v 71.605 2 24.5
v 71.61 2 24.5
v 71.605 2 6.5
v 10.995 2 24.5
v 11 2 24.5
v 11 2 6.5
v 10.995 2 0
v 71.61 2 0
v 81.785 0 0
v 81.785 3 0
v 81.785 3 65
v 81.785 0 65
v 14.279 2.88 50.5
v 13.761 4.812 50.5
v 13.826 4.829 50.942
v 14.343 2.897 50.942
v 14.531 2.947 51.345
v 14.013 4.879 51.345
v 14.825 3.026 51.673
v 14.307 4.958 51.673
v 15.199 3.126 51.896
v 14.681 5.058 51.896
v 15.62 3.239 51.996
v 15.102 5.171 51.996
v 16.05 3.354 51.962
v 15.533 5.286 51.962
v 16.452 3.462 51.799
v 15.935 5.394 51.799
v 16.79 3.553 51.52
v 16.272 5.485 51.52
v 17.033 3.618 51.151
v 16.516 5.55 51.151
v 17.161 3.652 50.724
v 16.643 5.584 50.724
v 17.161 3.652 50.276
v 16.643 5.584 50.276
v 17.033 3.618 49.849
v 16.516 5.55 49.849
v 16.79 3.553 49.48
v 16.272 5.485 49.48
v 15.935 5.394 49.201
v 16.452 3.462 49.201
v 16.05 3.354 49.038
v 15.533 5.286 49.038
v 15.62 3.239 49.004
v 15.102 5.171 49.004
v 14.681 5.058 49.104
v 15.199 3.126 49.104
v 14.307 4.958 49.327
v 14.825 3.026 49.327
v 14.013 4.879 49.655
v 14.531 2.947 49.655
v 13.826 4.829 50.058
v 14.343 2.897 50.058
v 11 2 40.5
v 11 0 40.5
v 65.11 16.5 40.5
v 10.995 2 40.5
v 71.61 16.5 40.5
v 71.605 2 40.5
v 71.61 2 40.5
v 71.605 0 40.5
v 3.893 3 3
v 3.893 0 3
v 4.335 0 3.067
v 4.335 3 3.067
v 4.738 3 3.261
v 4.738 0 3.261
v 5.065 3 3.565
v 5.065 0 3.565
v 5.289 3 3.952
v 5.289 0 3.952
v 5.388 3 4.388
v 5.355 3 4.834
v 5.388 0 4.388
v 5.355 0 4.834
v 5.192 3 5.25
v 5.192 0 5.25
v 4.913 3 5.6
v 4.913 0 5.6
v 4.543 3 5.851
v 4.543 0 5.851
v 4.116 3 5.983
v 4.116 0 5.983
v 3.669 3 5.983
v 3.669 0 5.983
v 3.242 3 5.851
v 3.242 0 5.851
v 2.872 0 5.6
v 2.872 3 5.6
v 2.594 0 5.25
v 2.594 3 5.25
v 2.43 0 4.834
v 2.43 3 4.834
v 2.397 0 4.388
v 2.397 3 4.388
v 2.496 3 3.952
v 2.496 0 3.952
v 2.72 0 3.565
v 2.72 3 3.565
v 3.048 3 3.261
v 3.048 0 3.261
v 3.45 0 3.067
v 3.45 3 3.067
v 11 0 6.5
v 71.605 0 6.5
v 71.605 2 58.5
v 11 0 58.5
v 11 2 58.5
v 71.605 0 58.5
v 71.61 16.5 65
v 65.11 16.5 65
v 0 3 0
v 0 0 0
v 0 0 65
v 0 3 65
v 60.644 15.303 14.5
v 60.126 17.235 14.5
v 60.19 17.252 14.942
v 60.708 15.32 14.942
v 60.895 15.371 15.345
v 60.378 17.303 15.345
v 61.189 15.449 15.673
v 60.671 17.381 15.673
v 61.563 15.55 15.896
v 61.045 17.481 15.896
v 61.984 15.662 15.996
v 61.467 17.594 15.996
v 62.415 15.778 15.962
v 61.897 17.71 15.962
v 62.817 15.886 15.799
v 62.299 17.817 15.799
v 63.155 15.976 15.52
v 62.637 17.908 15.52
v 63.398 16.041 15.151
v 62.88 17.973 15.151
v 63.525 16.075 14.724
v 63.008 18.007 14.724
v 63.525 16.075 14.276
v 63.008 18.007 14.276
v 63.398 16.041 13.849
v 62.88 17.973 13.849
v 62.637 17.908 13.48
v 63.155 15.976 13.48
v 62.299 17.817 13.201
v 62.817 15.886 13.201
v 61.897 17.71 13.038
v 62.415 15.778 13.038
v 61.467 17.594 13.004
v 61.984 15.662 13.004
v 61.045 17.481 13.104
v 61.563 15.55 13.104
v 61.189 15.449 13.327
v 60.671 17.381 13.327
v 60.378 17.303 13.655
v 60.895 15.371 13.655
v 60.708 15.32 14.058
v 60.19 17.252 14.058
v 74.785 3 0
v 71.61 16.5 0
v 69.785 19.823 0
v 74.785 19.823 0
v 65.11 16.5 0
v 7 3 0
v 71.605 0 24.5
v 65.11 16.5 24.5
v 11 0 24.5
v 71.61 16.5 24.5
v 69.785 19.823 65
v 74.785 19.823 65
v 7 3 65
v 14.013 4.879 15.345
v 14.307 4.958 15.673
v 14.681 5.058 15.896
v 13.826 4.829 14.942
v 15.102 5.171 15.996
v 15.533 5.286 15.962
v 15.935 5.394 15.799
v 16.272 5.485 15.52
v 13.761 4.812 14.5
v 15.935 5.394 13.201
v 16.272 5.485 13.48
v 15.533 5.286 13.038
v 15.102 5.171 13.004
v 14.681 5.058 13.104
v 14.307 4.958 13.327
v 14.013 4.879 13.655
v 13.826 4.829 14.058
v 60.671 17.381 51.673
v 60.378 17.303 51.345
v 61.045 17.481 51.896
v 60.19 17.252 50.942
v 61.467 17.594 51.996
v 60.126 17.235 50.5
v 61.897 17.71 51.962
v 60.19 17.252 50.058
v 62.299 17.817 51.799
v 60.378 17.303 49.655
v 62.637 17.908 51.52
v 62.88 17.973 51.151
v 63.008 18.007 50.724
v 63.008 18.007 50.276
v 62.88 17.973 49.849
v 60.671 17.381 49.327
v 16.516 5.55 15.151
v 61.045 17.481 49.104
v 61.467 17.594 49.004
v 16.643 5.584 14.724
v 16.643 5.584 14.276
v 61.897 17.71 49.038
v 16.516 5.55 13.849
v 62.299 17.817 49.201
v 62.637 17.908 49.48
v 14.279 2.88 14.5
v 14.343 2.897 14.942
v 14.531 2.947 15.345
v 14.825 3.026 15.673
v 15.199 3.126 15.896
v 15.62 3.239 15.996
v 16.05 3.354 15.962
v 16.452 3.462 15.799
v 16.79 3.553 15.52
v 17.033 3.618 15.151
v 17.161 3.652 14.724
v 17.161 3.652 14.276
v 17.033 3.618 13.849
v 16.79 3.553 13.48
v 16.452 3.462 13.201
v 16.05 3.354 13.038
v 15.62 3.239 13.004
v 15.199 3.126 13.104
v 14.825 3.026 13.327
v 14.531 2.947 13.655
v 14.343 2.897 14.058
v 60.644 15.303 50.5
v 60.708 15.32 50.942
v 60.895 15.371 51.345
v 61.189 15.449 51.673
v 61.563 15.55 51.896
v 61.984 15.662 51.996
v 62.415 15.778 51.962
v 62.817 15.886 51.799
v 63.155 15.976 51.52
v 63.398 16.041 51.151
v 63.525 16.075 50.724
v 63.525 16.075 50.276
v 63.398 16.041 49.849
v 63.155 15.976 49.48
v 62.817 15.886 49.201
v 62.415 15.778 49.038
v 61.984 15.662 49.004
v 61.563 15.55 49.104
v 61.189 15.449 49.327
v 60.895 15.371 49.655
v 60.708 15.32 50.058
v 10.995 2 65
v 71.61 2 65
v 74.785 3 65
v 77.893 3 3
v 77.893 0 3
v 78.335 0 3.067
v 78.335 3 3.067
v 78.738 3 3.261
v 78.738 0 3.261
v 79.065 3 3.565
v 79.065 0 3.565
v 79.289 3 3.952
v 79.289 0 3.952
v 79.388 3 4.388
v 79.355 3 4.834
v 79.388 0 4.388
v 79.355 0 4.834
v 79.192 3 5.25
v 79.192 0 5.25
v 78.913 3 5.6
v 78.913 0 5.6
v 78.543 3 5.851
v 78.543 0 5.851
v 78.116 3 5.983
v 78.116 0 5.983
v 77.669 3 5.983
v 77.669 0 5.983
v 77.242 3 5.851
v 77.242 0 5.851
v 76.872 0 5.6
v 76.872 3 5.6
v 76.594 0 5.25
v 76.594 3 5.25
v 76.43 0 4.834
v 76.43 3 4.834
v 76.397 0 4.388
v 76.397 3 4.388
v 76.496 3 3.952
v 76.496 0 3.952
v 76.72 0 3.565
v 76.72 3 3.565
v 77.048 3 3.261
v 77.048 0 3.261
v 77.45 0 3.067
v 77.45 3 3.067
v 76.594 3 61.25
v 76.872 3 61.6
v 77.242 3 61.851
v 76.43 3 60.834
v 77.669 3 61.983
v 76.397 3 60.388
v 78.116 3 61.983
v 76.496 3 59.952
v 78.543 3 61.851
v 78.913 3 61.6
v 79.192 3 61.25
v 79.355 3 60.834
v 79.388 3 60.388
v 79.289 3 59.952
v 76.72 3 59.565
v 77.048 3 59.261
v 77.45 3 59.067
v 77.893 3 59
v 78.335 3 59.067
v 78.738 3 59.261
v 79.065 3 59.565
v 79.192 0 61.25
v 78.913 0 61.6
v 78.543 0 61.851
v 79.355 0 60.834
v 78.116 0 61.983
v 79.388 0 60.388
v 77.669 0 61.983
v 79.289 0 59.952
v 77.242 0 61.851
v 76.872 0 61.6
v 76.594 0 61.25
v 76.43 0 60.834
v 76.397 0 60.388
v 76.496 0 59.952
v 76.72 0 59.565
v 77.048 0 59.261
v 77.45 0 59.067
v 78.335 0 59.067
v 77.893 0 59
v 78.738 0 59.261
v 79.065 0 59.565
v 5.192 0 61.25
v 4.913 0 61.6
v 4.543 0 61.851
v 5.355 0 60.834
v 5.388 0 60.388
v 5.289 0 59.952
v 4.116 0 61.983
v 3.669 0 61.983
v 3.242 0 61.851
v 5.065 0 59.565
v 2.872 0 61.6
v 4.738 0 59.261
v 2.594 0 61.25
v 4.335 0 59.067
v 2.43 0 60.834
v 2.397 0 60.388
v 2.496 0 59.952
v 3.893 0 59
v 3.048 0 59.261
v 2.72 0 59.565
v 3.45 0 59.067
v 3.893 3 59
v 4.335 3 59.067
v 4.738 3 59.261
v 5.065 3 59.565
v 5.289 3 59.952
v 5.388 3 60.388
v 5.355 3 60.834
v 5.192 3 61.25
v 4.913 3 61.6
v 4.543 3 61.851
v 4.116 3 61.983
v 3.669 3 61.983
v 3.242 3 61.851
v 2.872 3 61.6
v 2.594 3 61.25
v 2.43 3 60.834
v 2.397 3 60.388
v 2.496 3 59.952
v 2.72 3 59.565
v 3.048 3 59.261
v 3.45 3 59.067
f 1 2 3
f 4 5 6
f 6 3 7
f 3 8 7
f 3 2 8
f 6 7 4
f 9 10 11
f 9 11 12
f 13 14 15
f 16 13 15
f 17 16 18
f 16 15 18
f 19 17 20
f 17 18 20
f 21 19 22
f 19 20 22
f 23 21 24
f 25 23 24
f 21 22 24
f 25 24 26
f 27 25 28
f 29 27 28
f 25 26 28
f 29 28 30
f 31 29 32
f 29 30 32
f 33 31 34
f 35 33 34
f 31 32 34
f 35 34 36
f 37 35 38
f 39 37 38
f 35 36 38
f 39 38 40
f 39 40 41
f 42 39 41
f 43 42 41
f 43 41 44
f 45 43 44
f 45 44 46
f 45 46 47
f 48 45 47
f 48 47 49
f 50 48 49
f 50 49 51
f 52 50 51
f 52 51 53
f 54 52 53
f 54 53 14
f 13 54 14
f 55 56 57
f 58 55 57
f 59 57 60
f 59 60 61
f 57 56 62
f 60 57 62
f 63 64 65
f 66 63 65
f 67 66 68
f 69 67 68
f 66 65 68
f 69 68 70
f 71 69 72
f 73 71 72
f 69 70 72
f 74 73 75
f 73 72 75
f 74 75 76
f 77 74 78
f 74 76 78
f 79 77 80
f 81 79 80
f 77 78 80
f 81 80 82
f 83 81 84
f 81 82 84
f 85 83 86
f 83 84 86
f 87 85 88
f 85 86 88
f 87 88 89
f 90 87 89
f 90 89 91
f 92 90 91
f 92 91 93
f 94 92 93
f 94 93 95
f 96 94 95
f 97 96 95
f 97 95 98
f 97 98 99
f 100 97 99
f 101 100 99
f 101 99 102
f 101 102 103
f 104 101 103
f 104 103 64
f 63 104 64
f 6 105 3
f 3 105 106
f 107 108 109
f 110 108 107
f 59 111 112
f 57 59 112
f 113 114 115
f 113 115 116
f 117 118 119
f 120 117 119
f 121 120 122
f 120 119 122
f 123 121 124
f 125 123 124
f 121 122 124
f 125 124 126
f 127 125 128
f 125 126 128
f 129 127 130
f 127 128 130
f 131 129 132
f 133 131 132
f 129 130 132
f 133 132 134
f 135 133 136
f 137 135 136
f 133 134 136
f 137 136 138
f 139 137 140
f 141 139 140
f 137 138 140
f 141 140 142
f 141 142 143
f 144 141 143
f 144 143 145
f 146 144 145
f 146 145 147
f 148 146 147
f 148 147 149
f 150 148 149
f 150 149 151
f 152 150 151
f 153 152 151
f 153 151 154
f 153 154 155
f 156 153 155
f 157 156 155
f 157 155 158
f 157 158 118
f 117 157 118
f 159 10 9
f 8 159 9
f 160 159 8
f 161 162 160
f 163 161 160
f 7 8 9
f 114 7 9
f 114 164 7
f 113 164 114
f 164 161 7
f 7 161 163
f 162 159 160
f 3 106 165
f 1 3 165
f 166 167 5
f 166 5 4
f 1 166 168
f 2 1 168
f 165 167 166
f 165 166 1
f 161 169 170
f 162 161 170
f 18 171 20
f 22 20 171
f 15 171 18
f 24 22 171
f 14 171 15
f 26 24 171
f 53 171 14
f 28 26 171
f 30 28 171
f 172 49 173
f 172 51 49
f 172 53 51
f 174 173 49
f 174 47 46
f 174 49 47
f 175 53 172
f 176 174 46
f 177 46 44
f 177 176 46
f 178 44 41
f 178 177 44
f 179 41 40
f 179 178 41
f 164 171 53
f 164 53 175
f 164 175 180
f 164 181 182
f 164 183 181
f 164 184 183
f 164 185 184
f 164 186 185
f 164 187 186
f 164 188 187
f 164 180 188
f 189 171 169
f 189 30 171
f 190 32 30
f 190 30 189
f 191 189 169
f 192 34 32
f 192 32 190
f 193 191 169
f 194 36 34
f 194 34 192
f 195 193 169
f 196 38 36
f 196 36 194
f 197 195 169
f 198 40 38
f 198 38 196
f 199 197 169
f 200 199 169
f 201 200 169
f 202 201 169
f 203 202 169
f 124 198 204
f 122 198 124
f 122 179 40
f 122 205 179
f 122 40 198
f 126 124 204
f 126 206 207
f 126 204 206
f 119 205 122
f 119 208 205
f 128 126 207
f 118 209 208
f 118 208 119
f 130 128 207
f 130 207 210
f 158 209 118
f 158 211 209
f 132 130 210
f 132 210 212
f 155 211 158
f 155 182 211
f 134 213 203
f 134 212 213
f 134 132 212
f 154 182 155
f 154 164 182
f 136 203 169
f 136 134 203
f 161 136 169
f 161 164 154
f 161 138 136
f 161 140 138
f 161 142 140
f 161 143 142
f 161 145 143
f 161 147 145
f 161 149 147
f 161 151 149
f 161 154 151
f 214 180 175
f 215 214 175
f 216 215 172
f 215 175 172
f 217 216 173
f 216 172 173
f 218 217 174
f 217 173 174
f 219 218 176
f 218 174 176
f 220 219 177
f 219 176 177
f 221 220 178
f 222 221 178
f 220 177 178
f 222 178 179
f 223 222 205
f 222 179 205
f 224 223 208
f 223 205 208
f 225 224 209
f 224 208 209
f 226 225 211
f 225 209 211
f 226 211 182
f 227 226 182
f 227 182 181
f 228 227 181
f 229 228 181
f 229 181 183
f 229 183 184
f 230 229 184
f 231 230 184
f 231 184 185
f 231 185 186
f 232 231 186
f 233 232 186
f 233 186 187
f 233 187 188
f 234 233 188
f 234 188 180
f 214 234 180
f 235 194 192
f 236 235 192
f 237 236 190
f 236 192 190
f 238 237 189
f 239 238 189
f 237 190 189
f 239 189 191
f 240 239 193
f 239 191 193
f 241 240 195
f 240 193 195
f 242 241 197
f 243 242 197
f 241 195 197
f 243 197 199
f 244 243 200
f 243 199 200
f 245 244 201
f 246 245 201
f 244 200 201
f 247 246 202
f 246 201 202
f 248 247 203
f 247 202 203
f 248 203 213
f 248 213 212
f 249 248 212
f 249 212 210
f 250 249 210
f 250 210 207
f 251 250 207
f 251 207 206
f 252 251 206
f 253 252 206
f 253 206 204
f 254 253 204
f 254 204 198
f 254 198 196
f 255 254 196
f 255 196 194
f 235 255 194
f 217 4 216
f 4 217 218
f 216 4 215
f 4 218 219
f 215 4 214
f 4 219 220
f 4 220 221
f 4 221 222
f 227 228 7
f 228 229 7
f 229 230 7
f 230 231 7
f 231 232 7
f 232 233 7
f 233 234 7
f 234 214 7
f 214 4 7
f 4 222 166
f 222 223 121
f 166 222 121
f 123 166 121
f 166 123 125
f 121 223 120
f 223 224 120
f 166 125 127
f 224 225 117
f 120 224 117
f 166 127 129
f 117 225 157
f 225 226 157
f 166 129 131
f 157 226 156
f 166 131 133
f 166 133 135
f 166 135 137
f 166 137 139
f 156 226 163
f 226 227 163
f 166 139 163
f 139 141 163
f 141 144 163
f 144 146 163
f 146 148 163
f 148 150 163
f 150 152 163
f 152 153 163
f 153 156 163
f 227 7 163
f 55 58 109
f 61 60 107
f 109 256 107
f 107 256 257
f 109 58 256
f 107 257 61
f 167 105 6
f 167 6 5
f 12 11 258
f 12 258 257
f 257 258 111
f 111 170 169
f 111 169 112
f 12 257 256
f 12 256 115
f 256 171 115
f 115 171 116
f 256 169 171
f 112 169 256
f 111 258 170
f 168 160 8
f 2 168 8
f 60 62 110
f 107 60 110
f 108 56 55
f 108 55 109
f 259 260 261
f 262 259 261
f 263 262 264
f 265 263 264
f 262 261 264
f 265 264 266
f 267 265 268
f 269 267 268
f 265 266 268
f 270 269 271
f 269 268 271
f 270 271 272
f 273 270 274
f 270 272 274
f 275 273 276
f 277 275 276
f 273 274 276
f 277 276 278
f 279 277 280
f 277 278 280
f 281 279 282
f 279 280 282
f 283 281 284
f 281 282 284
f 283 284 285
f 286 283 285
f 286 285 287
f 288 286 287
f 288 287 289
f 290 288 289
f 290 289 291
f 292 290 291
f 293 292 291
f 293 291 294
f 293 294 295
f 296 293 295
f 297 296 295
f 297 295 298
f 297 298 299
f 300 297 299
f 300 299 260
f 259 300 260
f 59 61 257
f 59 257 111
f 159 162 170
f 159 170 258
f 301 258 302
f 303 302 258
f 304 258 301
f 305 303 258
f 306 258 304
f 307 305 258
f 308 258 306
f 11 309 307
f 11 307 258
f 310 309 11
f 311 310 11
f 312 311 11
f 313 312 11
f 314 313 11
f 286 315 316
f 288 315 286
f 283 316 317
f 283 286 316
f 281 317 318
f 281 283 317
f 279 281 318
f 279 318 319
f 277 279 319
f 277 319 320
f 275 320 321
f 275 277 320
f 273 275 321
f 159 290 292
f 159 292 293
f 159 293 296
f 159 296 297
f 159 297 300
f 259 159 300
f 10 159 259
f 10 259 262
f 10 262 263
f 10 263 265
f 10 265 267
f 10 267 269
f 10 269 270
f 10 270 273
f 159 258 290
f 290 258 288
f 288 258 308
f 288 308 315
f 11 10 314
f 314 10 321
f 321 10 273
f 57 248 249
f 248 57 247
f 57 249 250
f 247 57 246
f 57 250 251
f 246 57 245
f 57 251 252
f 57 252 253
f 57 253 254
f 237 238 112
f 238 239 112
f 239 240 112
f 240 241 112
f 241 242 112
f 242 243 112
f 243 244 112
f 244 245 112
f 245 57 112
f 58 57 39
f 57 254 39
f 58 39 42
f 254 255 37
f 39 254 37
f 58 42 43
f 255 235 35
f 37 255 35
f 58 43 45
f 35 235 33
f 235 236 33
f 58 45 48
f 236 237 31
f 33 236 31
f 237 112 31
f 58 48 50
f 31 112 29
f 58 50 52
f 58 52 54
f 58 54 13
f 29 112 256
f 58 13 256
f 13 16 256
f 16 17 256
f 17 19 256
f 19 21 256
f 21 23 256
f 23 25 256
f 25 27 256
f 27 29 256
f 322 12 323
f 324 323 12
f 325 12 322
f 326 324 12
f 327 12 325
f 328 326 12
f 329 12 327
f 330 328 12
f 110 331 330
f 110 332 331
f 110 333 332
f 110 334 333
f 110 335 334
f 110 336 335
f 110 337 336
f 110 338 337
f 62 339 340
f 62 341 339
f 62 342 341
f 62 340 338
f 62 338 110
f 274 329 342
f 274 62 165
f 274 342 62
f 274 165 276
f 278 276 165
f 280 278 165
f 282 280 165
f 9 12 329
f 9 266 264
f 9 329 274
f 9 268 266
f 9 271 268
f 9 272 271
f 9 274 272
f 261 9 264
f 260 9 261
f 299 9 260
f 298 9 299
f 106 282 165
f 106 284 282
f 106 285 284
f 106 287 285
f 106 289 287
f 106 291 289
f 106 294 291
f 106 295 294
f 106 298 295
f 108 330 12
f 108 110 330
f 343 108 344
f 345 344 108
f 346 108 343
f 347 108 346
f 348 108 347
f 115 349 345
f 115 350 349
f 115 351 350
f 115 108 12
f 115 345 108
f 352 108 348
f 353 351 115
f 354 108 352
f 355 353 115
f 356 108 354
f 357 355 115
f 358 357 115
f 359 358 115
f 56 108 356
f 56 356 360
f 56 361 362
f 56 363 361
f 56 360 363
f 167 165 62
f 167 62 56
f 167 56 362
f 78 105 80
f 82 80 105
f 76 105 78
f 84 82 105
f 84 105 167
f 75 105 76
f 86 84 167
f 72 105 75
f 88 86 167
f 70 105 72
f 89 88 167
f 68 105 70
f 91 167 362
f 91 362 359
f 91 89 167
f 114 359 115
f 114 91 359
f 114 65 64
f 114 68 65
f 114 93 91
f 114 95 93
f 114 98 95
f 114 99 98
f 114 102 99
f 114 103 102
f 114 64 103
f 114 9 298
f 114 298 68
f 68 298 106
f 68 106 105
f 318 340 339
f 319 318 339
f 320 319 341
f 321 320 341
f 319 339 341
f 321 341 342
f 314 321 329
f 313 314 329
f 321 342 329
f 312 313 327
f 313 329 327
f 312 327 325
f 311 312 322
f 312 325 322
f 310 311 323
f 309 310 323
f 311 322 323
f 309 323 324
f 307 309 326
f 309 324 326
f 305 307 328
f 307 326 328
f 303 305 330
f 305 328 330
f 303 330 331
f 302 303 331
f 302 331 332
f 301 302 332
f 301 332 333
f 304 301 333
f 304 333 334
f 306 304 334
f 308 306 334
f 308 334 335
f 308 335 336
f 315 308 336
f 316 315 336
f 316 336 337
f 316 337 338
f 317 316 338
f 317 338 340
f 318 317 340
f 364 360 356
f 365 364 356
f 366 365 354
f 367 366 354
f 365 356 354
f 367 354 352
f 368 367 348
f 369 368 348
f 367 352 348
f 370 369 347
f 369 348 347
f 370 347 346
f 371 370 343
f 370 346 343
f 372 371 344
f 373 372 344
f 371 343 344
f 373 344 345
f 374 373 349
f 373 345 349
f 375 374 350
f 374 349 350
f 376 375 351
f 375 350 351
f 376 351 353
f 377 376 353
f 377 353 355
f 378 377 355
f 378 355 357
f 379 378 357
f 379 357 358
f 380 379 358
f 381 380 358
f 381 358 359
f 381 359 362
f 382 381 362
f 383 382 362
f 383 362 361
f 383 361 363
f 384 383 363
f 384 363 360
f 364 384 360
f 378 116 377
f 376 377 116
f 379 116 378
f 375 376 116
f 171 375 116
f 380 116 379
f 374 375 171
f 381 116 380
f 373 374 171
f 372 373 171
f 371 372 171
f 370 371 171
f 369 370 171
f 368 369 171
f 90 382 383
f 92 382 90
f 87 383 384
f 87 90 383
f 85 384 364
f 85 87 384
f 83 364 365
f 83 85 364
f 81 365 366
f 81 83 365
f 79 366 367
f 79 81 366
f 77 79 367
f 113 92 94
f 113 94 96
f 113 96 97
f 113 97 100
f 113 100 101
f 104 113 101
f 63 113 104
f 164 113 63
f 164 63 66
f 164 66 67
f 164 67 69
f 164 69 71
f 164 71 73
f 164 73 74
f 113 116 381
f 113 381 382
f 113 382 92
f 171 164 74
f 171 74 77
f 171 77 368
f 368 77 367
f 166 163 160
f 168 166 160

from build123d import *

# Parameters (mm, degrees)
EXTRUDE_4_DEPTH     = 65
CUT_EXTRUDE_2_DEPTH = 24.5
CUT_EXTRUDE_3_DEPTH = 24.5
CUT_EXTRUDE_5_REACH = 108.333
SKETCH_11_R         = 1.5
SKETCH_11_W         = 60.605178709
SKETCH_11_H         = 18
CUT_EXTRUDE_4_REACH = 108.359
SKETCH_8_R          = 1.5


with BuildPart() as part:
    # 草图1 → 凸台-拉伸4 (new body)
    with BuildSketch(Plane.XY):
        Polygon((0, 0), (0, 3), (7, 3), (69.785178709, 19.823237932), (74.785178709, 19.823237932), (74.785178709, 3), (81.785178709, 3), (81.785178709, 0), align=None)
    extrude(amount=EXTRUDE_4_DEPTH)

    # 草图9 → 切除-拉伸2 (cut)
    with BuildSketch(Plane.XY.offset(65)):
        Polygon((65.110092512, 16.5), (10.995355803, 2), (71.610092512, 2), (71.610092512, 16.5), align=None)
    extrude(amount=-CUT_EXTRUDE_2_DEPTH, mode=Mode.SUBTRACT)

    # 草图10 → 切除-拉伸3 (cut)
    with BuildSketch(Plane(origin=(0, 0, 0), x_dir=(-1, 0, 0), z_dir=(0, 0, -1))):
        Polygon((-71.610092512, 2), (-10.995355803, 2), (-65.110092512, 16.5), (-71.610092512, 16.5), align=None)
    extrude(amount=-CUT_EXTRUDE_3_DEPTH, mode=Mode.SUBTRACT)

    # 草图11 → 切除-拉伸5 (cut, up to next)
    with BuildSketch(Plane.XZ, mode=Mode.PRIVATE) as cut_extrude_5_sk1:
        with Locations(Location((3.892589354, 60.5, 0), (0, 0, 270))):
            Circle(SKETCH_11_R)
    cut_extrude_5_tool1 = extrude(cut_extrude_5_sk1.sketch, amount=-CUT_EXTRUDE_5_REACH, mode=Mode.PRIVATE) & part.part
    # 草图11 → 切除-拉伸5 (cut, up to next)
    with BuildSketch(Plane.XZ, mode=Mode.PRIVATE) as cut_extrude_5_sk2:
        with Locations(Location((77.892589354, 60.5, 0), (0, 0, 270))):
            Circle(SKETCH_11_R)
    cut_extrude_5_tool2 = extrude(cut_extrude_5_sk2.sketch, amount=-CUT_EXTRUDE_5_REACH, mode=Mode.PRIVATE) & part.part
    # 草图11 → 切除-拉伸5 (cut, up to next)
    with BuildSketch(Plane.XZ, mode=Mode.PRIVATE) as cut_extrude_5_sk3:
        with Locations(Location((77.892589354, 4.5, 0), (0, 0, 270))):
            Circle(SKETCH_11_R)
    cut_extrude_5_tool3 = extrude(cut_extrude_5_sk3.sketch, amount=-CUT_EXTRUDE_5_REACH, mode=Mode.PRIVATE) & part.part
    # 草图11 → 切除-拉伸5 (cut, up to next)
    with BuildSketch(Plane.XZ, mode=Mode.PRIVATE) as cut_extrude_5_sk4:
        with Locations(Location((3.892589354, 4.5, 0), (0, 0, 270))):
            Circle(SKETCH_11_R)
    cut_extrude_5_tool4 = extrude(cut_extrude_5_sk4.sketch, amount=-CUT_EXTRUDE_5_REACH, mode=Mode.PRIVATE) & part.part
    # 草图11 → 切除-拉伸5 (cut, up to next)
    with BuildSketch(Plane.XZ, mode=Mode.PRIVATE) as cut_extrude_5_sk5:
        with Locations((41.302589355, 49.5)):
            Rectangle(SKETCH_11_W, SKETCH_11_H)
    cut_extrude_5_tool5 = extrude(cut_extrude_5_sk5.sketch, amount=-CUT_EXTRUDE_5_REACH, mode=Mode.PRIVATE) & part.part
    # 草图11 → 切除-拉伸5 (cut, up to next)
    with BuildSketch(Plane.XZ, mode=Mode.PRIVATE) as cut_extrude_5_sk6:
        with Locations((41.302589355, 15.5)):
            Rectangle(SKETCH_11_W, SKETCH_11_H)
    cut_extrude_5_tool6 = extrude(cut_extrude_5_sk6.sketch, amount=-CUT_EXTRUDE_5_REACH, mode=Mode.PRIVATE) & part.part
    add(cut_extrude_5_tool1.solids().sort_by_distance((3.892589, 0, 60.5))[0], mode=Mode.SUBTRACT)
    add(cut_extrude_5_tool2.solids().sort_by_distance((77.892589, 0, 60.5))[0], mode=Mode.SUBTRACT)
    add(cut_extrude_5_tool3.solids().sort_by_distance((77.892589, 0, 4.5))[0], mode=Mode.SUBTRACT)
    add(cut_extrude_5_tool4.solids().sort_by_distance((3.892589, 0, 4.5))[0], mode=Mode.SUBTRACT)
    add(cut_extrude_5_tool5.solids().sort_by_distance((41.302589, 0, 49.5))[0], mode=Mode.SUBTRACT)
    add(cut_extrude_5_tool6.solids().sort_by_distance((41.302589, 0, 15.5))[0], mode=Mode.SUBTRACT)

    # 草图8 → 切除-拉伸4 (cut, up to next)
    with BuildSketch(Plane(origin=(-0.281088913, 1.049038106, 0), x_dir=(0.9659258262890681, 0.25881904510252157, 0), z_dir=(-0.25881904510252157, 0.9659258262890681, 0)), mode=Mode.PRIVATE) as cut_extrude_4_sk1:
        with Locations(Location((16.037937919, -14.5, 0), (0, 0, 180))):
            Circle(SKETCH_8_R)
    cut_extrude_4_tool1 = extrude(cut_extrude_4_sk1.sketch, amount=-CUT_EXTRUDE_4_REACH, mode=Mode.PRIVATE) & part.part
    # 草图8 → 切除-拉伸4 (cut, up to next)
    with BuildSketch(Plane(origin=(-0.281088913, 1.049038106, 0), x_dir=(0.9659258262890681, 0.25881904510252157, 0), z_dir=(-0.25881904510252157, 0.9659258262890681, 0)), mode=Mode.PRIVATE) as cut_extrude_4_sk2:
        with Locations(Location((64.037937919, -14.5, 0), (0, 0, 180))):
            Circle(SKETCH_8_R)
    cut_extrude_4_tool2 = extrude(cut_extrude_4_sk2.sketch, amount=-CUT_EXTRUDE_4_REACH, mode=Mode.PRIVATE) & part.part
    # 草图8 → 切除-拉伸4 (cut, up to next)
    with BuildSketch(Plane(origin=(-0.281088913, 1.049038106, 0), x_dir=(0.9659258262890681, 0.25881904510252157, 0), z_dir=(-0.25881904510252157, 0.9659258262890681, 0)), mode=Mode.PRIVATE) as cut_extrude_4_sk3:
        with Locations(Location((64.037937919, -50.5, 0), (0, 0, 180))):
            Circle(SKETCH_8_R)
    cut_extrude_4_tool3 = extrude(cut_extrude_4_sk3.sketch, amount=-CUT_EXTRUDE_4_REACH, mode=Mode.PRIVATE) & part.part
    # 草图8 → 切除-拉伸4 (cut, up to next)
    with BuildSketch(Plane(origin=(-0.281088913, 1.049038106, 0), x_dir=(0.9659258262890681, 0.25881904510252157, 0), z_dir=(-0.25881904510252157, 0.9659258262890681, 0)), mode=Mode.PRIVATE) as cut_extrude_4_sk4:
        with Locations(Location((16.037937919, -50.5, 0), (0, 0, 180))):
            Circle(SKETCH_8_R)
    cut_extrude_4_tool4 = extrude(cut_extrude_4_sk4.sketch, amount=-CUT_EXTRUDE_4_REACH, mode=Mode.PRIVATE) & part.part
    add(cut_extrude_4_tool1.solids().sort_by_distance((15.21037, 5.199962, 14.5))[0], mode=Mode.SUBTRACT)
    add(cut_extrude_4_tool2.solids().sort_by_distance((61.574809, 17.623276, 14.5))[0], mode=Mode.SUBTRACT)
    add(cut_extrude_4_tool3.solids().sort_by_distance((61.574809, 17.623276, 50.5))[0], mode=Mode.SUBTRACT)
    add(cut_extrude_4_tool4.solids().sort_by_distance((15.21037, 5.199962, 50.5))[0], mode=Mode.SUBTRACT)


solid = part.part
